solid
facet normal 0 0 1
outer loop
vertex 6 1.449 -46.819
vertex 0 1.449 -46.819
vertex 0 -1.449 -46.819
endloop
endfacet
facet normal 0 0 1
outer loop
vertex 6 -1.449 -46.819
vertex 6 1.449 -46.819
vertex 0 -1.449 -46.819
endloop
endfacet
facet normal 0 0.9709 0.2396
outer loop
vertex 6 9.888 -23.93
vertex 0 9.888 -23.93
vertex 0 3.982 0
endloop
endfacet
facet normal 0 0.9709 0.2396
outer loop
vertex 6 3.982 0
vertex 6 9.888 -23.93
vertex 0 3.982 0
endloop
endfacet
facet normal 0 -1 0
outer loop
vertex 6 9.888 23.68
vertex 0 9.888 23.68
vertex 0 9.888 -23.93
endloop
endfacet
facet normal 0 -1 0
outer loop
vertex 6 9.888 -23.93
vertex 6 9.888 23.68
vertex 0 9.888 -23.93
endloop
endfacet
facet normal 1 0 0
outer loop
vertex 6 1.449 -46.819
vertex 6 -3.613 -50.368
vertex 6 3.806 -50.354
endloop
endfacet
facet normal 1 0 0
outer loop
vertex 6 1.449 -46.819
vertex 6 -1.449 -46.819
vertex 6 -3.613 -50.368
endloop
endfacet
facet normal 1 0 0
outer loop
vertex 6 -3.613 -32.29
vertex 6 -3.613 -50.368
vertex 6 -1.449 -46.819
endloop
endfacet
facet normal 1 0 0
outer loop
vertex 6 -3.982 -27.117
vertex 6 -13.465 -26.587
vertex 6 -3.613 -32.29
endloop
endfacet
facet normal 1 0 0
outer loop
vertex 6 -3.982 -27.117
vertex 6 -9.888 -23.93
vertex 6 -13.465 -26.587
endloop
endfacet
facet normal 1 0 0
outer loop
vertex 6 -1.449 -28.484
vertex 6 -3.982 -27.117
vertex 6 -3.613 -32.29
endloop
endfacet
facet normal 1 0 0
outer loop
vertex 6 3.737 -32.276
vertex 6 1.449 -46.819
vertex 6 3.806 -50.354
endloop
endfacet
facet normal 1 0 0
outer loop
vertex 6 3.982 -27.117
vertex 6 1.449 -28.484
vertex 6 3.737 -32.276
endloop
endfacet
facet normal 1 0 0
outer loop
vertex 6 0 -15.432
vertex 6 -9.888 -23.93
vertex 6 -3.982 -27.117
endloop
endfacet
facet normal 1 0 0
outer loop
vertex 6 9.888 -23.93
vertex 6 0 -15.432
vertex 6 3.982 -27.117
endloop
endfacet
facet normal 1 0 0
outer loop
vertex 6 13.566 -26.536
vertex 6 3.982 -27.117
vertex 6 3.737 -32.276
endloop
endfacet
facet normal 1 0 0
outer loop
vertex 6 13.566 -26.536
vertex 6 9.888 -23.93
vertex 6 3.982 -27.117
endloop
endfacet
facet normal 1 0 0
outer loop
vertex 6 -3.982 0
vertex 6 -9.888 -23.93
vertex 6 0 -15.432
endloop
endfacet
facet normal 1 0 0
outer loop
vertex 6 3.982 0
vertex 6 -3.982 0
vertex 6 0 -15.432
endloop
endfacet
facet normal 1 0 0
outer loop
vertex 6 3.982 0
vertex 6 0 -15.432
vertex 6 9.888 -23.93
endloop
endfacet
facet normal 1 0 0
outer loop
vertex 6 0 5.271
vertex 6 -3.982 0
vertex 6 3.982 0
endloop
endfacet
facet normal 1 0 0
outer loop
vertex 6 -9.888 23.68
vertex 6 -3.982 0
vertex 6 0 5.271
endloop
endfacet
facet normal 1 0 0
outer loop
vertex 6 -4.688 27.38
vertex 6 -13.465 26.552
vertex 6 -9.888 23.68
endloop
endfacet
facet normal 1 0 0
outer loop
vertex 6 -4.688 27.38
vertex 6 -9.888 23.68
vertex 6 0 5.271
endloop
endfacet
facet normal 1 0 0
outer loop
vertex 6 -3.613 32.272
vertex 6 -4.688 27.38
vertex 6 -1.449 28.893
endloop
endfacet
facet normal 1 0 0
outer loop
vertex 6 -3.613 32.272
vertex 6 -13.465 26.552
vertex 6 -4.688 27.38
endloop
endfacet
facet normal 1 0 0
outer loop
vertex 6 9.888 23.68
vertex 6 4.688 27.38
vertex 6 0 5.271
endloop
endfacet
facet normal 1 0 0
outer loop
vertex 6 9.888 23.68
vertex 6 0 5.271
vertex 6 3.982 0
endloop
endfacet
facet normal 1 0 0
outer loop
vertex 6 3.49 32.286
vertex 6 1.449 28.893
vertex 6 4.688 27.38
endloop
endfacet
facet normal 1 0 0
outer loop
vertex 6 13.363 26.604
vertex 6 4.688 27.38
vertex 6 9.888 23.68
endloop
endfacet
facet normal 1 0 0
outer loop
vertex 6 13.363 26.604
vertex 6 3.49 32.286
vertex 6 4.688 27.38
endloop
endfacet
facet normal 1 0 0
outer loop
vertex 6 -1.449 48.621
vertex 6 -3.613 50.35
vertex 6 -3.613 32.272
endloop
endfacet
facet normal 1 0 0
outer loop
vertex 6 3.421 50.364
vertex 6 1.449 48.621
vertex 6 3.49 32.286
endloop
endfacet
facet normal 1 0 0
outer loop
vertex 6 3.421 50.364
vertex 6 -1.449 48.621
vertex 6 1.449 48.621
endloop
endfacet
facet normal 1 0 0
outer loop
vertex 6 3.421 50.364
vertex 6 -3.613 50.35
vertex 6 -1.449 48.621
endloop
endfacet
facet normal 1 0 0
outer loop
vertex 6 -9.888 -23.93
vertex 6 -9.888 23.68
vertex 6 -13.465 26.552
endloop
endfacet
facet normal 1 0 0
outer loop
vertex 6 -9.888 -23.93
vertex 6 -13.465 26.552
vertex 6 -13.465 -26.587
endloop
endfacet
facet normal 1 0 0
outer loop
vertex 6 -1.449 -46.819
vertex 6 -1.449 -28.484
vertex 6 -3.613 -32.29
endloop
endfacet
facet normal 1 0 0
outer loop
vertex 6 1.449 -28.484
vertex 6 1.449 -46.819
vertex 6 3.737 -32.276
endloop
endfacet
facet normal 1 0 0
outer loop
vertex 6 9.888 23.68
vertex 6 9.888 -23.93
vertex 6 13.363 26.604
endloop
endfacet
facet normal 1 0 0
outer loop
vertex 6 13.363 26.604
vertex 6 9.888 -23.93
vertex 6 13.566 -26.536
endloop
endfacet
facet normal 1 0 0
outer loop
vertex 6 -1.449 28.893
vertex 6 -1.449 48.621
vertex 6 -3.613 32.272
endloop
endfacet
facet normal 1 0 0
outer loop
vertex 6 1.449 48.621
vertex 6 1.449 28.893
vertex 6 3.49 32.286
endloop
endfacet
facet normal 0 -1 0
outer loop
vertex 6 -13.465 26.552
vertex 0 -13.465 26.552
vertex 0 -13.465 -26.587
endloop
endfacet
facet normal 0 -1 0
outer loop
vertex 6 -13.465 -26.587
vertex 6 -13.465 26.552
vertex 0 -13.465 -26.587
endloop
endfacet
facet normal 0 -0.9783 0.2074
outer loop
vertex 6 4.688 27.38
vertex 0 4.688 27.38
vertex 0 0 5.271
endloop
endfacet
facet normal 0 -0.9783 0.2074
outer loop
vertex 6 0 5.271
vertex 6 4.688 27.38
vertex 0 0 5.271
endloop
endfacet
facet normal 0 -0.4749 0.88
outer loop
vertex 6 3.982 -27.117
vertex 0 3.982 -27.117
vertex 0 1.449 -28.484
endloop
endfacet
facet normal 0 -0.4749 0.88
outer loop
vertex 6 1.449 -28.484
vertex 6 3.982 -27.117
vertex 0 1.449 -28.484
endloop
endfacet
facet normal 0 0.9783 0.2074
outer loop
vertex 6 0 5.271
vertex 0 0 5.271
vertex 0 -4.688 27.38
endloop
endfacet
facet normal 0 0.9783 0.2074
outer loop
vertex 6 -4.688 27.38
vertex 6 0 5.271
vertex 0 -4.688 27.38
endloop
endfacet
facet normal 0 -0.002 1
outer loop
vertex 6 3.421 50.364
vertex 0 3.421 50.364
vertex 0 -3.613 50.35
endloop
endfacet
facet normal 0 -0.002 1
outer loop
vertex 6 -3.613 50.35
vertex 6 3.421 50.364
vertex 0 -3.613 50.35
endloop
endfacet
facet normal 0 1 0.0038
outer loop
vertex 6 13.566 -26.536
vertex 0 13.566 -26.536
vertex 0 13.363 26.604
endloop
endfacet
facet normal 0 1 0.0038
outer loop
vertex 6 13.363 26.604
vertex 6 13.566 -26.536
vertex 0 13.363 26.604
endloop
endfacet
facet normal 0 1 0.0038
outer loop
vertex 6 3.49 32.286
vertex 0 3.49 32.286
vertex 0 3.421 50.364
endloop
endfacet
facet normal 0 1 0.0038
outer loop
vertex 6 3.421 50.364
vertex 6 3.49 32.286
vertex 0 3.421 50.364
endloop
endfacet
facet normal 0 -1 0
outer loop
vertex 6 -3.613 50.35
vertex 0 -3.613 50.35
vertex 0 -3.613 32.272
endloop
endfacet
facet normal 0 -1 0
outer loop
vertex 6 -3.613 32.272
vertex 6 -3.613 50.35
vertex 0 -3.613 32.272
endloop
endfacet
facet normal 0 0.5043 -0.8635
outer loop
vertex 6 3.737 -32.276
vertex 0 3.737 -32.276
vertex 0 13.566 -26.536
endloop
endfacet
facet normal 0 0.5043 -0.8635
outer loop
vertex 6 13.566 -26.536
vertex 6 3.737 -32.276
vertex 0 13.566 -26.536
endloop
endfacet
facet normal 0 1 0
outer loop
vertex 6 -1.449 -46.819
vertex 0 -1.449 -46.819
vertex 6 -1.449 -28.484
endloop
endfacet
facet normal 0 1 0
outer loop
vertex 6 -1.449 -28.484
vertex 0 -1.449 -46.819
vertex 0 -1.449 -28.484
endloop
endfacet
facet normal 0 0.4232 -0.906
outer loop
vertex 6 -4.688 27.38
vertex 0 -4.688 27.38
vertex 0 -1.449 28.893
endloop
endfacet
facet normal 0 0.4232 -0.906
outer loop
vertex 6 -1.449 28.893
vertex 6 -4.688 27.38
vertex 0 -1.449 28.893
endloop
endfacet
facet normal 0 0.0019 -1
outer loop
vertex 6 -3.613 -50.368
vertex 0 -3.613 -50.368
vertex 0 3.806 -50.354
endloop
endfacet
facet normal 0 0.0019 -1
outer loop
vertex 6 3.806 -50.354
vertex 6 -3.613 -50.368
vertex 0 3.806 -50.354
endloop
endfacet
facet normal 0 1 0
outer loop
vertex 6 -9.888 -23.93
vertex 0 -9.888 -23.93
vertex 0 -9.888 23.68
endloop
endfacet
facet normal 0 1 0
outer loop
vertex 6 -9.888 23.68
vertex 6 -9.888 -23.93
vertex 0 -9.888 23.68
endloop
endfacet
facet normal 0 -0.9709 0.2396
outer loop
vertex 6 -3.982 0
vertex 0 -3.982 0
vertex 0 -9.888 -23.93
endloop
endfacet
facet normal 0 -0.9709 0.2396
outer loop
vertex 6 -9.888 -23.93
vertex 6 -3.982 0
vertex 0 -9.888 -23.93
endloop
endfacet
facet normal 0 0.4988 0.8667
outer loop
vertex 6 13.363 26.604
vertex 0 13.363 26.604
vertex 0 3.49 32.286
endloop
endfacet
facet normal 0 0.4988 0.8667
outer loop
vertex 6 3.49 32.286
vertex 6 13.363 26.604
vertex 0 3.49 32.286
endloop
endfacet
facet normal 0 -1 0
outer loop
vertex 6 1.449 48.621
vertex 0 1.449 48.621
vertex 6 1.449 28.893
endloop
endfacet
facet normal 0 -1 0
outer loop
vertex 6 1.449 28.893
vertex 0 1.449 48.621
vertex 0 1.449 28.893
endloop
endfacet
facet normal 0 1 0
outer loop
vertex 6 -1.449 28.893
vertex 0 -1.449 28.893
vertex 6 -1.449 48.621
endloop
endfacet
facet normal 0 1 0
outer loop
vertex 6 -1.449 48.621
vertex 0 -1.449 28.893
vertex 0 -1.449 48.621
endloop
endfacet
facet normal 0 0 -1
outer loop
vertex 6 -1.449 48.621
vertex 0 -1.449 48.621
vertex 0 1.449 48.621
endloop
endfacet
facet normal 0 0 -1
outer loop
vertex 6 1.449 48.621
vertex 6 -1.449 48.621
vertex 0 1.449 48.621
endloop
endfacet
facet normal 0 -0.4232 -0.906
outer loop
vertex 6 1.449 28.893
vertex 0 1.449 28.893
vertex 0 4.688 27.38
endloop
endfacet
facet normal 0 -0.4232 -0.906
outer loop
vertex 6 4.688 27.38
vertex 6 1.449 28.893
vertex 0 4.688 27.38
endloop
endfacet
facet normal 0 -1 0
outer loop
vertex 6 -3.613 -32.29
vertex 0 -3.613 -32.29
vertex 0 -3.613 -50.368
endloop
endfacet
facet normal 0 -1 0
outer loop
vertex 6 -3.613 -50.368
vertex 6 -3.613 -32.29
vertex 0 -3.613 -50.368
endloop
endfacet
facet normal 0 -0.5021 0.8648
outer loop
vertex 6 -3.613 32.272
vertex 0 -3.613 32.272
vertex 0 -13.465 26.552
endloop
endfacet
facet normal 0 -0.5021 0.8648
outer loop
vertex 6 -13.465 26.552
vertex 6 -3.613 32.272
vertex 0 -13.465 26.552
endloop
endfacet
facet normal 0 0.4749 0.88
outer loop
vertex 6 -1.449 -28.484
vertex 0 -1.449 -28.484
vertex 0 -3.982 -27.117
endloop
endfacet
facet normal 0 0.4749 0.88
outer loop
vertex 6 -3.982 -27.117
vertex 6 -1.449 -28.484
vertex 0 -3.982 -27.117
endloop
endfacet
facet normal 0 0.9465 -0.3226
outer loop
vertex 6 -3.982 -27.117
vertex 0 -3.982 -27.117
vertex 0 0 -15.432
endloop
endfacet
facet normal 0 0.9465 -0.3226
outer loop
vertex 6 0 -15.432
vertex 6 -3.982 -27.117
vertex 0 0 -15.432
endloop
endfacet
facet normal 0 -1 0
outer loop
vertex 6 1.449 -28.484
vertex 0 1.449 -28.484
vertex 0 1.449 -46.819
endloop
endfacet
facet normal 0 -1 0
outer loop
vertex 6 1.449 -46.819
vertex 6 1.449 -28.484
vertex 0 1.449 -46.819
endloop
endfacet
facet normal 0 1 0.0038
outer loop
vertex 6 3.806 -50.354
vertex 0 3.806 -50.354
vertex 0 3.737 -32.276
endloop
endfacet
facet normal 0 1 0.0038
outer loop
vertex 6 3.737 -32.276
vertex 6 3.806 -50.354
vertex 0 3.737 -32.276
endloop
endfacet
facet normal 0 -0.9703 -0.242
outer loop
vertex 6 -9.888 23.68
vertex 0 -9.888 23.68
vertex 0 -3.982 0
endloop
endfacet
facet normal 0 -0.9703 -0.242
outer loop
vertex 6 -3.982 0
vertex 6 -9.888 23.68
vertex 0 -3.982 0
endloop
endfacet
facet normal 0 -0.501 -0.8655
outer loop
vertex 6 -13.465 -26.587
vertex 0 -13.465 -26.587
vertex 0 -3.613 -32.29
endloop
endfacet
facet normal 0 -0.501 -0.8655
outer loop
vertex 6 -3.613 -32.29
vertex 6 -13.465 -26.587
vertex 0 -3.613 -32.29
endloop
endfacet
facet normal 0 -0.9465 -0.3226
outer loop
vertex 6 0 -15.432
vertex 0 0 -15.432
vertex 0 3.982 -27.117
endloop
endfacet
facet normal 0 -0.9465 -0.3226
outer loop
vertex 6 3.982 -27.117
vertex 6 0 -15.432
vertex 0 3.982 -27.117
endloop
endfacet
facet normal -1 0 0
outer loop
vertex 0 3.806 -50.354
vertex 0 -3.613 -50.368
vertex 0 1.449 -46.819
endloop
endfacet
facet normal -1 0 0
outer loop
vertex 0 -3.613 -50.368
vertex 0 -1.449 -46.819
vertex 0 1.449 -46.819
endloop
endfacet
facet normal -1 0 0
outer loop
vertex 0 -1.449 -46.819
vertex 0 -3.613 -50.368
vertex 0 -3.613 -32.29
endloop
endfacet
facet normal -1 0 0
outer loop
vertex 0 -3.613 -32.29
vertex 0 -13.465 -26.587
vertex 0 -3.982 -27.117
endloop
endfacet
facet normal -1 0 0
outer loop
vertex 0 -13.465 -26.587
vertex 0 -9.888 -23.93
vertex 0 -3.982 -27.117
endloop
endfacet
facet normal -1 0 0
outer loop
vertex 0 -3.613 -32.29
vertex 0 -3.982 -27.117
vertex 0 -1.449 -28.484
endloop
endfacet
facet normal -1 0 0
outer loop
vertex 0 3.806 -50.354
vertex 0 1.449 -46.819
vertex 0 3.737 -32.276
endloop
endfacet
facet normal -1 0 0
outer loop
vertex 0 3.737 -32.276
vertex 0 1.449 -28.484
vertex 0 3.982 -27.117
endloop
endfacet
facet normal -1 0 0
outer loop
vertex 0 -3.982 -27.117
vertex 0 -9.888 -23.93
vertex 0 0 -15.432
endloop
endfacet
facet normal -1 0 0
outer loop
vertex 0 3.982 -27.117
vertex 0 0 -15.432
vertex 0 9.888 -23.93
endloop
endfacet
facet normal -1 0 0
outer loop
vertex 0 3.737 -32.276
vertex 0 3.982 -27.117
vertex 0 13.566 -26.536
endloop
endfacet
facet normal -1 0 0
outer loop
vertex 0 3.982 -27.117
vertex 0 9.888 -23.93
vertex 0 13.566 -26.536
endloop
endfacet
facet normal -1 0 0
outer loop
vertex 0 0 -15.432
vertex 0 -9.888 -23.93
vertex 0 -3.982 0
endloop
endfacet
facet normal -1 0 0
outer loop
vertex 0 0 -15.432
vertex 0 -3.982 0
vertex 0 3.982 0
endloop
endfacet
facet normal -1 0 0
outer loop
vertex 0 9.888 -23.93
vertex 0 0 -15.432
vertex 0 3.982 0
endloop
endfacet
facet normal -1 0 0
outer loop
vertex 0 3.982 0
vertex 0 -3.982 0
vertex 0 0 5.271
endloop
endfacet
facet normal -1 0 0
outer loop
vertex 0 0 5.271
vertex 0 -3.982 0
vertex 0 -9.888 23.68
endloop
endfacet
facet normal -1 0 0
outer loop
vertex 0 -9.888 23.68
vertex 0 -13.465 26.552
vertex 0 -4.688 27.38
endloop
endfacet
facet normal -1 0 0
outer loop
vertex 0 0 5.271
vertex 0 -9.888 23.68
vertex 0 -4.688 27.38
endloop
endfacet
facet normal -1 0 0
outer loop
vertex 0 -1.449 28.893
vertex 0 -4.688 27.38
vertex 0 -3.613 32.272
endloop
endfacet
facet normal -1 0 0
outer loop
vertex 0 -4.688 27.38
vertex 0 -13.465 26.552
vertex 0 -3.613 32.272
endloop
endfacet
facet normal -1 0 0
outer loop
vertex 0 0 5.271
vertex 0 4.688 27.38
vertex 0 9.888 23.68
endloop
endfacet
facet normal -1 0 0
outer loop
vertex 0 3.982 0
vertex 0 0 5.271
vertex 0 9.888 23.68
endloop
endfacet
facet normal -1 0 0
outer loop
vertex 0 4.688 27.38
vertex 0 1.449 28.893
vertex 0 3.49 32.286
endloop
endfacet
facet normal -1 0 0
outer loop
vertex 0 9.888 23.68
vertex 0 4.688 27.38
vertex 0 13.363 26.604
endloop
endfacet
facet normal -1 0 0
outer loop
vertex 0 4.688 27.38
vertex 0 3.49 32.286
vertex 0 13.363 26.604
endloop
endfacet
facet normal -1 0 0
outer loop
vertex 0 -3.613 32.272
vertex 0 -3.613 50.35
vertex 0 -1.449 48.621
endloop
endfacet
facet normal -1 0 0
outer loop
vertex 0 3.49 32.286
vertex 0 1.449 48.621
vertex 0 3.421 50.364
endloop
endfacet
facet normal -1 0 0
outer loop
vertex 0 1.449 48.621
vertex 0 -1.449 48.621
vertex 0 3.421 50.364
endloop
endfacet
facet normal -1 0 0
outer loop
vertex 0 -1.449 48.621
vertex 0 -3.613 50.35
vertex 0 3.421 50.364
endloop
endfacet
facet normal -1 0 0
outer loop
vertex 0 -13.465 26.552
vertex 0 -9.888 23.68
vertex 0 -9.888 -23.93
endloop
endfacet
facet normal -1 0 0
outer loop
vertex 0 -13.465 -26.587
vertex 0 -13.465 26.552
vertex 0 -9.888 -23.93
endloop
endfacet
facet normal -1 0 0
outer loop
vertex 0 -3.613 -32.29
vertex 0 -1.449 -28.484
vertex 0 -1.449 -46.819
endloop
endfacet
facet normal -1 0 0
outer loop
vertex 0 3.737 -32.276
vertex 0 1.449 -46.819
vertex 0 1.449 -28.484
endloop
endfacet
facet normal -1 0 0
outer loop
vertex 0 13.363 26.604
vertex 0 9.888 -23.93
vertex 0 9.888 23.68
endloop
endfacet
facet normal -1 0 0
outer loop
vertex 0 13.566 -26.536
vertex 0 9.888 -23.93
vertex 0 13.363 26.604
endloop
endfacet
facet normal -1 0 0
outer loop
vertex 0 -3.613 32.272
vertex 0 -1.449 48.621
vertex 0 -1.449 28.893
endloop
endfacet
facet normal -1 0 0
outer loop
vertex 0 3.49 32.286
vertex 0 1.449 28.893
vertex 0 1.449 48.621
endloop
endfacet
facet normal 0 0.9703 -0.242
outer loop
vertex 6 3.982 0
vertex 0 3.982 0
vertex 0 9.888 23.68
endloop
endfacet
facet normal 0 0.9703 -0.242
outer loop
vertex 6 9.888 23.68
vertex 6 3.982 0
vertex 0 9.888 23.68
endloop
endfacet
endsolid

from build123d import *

# Parameters (mm, degrees)
F1_DEPTH = 4
F2_DEPTH = 6


with BuildPart() as f1:
    # F0 (on Right) → F1 (new body)
    with BuildSketch(Plane.YZ):
        Polygon((3.420798, 50.363688), (-3.613221, 50.350249), (-3.613221, 32.27243), (-13.464639, 26.55225), (-13.464639, -26.587166), (-3.613221, -32.290113), (-3.613221, -50.367933), (3.805658, -50.353758), (3.73658, -32.27607), (13.566135, -26.535521), (13.363081, 26.603507), (3.489876, 32.286001), align=None)
        Polygon((-1.448536, -46.818957), (-1.448536, -28.4841), (-3.981812, -27.11692), (0, -15.432488), (3.981812, -27.11692), (1.448536, -28.4841), (1.448536, -46.818957), align=None, mode=Mode.SUBTRACT)
        Polygon((-9.887695, -23.929583), (-9.887695, 23.680427), (-3.981812, 0), align=None, mode=Mode.SUBTRACT)
        Polygon((3.981812, 0), (9.887695, 23.680427), (9.887695, -23.929583), align=None, mode=Mode.SUBTRACT)
        Polygon((-1.448536, 28.89285), (-1.448536, 48.621111), (1.448536, 48.621111), (1.448536, 28.89285), (4.687637, 27.380314), (0, 5.270754), (-4.687637, 27.380314), align=None, mode=Mode.SUBTRACT)
    extrude(amount=F1_DEPTH)

    # F0 (on Right) → F2 (join)
    with BuildSketch(Plane.YZ):
        Polygon((3.420798, 50.363688), (-3.613221, 50.350249), (-3.613221, 32.27243), (-13.464639, 26.55225), (-13.464639, -26.587166), (-3.613221, -32.290113), (-3.613221, -50.367933), (3.805658, -50.353758), (3.73658, -32.27607), (13.566135, -26.535521), (13.363081, 26.603507), (3.489876, 32.286001), align=None)
        Polygon((-1.448536, -46.818957), (-1.448536, -28.4841), (-3.981812, -27.11692), (0, -15.432488), (3.981812, -27.11692), (1.448536, -28.4841), (1.448536, -46.818957), align=None, mode=Mode.SUBTRACT)
        Polygon((-9.887695, -23.929583), (-9.887695, 23.680427), (-3.981812, 0), align=None, mode=Mode.SUBTRACT)
        Polygon((3.981812, 0), (9.887695, 23.680427), (9.887695, -23.929583), align=None, mode=Mode.SUBTRACT)
        Polygon((-1.448536, 28.89285), (-1.448536, 48.621111), (1.448536, 48.621111), (1.448536, 28.89285), (4.687637, 27.380314), (0, 5.270754), (-4.687637, 27.380314), align=None, mode=Mode.SUBTRACT)
    extrude(amount=F2_DEPTH)


solid = f1.part
